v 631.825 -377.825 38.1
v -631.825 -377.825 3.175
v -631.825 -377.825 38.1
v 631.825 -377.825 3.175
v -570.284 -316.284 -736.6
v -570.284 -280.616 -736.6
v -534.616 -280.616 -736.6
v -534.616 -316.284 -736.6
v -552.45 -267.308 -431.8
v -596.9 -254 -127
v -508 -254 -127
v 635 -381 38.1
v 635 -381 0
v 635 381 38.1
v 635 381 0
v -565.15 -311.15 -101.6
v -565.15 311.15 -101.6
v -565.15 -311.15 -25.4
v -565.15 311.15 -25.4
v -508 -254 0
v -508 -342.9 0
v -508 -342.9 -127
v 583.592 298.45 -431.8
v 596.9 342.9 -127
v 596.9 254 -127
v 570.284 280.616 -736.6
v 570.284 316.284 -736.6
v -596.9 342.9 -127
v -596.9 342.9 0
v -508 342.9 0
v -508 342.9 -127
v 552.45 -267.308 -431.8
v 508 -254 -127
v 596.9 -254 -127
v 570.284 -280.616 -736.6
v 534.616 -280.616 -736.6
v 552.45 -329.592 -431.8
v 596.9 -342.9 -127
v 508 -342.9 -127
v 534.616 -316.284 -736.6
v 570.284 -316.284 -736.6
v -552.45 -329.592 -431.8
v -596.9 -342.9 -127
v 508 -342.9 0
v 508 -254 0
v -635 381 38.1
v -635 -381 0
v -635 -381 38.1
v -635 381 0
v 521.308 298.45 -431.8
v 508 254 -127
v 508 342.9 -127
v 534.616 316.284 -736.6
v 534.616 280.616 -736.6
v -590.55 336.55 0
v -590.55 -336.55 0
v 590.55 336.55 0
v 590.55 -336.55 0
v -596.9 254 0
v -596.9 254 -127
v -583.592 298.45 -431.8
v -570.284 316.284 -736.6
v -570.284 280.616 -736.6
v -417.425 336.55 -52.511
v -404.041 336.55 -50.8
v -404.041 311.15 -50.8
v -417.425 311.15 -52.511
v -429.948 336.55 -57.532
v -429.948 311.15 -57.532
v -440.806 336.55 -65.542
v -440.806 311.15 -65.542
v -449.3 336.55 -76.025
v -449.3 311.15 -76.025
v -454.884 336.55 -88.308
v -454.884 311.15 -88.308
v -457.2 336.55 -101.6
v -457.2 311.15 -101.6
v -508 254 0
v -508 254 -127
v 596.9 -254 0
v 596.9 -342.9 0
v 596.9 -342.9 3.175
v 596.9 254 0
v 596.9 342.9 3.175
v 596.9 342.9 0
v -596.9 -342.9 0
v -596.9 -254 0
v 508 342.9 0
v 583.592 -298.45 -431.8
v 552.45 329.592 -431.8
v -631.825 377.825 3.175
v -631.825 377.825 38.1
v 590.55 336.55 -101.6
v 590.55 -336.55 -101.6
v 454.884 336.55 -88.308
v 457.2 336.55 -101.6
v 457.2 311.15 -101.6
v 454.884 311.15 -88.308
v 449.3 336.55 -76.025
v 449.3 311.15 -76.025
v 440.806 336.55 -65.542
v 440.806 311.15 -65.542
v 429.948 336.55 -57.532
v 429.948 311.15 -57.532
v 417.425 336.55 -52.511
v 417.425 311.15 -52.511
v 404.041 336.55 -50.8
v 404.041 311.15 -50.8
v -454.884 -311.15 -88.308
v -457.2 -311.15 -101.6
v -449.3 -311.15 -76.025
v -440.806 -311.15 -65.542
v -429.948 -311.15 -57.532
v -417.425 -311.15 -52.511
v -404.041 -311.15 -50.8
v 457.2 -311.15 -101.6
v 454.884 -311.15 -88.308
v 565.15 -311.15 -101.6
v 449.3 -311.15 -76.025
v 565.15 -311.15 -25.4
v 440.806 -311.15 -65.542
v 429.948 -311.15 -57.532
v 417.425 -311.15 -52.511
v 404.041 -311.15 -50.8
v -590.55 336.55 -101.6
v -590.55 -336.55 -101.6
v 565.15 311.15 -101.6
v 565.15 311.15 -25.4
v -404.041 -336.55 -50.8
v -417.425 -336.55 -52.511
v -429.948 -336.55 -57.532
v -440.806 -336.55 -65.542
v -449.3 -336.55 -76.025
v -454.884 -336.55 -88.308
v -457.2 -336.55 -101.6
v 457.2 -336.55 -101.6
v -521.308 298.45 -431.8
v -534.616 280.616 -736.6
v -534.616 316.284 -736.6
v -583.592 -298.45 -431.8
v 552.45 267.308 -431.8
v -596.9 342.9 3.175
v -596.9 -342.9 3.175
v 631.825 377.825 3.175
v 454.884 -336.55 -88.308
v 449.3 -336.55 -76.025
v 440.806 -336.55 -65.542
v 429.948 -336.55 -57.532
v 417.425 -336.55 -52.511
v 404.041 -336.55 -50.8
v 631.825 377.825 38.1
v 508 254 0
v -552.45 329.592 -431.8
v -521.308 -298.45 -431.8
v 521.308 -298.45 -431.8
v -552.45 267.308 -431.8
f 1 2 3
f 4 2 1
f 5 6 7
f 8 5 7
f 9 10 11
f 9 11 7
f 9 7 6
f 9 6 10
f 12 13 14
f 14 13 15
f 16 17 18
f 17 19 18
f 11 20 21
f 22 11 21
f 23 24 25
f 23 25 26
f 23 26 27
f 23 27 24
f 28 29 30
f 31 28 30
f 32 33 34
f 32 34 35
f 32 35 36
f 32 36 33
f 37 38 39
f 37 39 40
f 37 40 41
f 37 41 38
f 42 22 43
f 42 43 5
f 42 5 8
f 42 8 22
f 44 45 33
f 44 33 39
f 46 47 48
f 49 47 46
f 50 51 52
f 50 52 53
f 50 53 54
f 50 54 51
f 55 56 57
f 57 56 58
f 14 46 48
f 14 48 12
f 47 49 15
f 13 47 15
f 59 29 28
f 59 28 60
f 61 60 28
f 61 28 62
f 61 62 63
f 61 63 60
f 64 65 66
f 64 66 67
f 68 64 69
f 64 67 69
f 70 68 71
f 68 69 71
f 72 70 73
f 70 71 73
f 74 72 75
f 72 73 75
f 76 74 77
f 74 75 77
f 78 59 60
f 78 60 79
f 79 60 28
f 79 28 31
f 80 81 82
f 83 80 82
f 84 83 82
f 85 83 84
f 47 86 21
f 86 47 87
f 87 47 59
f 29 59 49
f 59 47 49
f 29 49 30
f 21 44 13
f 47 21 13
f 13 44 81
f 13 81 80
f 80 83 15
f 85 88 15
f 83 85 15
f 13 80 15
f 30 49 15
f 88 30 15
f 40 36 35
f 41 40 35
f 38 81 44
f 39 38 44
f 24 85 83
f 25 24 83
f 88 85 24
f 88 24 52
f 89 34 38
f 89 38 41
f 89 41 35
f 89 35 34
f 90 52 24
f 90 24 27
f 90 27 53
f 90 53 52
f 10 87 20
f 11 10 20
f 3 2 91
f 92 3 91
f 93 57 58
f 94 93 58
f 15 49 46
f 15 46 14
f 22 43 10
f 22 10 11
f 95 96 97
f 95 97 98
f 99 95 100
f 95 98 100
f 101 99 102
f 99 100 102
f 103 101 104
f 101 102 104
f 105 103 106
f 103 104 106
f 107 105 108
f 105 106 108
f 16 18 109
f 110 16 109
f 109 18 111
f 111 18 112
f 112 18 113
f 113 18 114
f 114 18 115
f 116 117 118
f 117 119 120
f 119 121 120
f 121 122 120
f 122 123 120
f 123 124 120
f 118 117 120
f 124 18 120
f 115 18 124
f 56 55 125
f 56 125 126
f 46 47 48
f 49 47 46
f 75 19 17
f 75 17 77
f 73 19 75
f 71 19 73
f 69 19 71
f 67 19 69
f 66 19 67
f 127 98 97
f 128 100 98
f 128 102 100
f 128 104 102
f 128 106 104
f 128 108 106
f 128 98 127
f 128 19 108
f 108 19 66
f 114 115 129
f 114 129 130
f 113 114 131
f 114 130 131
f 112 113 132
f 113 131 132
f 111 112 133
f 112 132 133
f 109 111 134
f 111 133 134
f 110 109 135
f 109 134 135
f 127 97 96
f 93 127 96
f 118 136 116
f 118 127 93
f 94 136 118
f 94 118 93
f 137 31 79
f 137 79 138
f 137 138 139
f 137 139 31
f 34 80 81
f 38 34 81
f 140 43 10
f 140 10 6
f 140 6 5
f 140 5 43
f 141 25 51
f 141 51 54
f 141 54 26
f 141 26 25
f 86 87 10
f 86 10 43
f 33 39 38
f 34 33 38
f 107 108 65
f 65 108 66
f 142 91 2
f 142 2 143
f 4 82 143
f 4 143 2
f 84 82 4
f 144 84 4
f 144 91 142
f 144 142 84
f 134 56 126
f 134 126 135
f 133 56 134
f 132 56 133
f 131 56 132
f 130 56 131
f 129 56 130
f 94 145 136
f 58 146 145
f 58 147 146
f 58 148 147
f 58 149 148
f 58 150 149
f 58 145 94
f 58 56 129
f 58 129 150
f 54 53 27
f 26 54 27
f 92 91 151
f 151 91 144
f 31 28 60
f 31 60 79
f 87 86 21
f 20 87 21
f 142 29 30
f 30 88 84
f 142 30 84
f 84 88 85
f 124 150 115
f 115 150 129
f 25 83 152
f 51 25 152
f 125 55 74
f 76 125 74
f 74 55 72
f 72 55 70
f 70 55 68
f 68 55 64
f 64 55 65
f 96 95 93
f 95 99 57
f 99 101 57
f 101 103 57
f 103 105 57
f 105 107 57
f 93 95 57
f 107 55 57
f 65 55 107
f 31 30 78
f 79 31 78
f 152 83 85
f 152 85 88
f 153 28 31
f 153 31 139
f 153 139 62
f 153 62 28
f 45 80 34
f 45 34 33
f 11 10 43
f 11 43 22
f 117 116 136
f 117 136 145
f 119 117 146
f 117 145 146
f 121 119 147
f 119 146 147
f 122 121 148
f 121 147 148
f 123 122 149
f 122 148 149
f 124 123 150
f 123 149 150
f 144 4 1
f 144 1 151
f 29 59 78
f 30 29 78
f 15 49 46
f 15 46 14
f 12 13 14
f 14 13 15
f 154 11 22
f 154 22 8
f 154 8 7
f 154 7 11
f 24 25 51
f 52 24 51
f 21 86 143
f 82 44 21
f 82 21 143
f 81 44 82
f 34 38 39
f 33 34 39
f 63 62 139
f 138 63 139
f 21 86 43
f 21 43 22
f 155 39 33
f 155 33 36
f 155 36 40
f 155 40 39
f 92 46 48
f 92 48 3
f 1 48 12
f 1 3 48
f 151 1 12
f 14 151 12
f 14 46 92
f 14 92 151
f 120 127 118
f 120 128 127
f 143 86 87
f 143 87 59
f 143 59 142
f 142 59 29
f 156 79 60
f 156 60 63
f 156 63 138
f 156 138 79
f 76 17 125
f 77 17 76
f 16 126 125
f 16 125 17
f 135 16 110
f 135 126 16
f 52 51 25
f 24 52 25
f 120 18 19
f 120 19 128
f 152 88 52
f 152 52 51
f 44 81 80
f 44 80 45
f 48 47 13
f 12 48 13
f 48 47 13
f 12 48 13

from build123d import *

# Parameters (mm, degrees)
F0_W      = 1270
F0_H      = 762
F0_W_2    = 1263.65
F0_H_2    = 755.65
F1_DEPTH  = 38.1
F3_W      = 88.9
F3_H      = 88.9
F4_DEPTH  = 127
F6_W      = 1181.1
F6_H      = 673.1
F7_DEPTH  = 101.6
F8_T      = -25.4
F9_W      = 1270
F9_H      = 762
F9_W_2    = 1193.8
F9_H_2    = 685.8
F10_DEPTH = 3.175
F11_W     = 1270
F11_H     = 762
F12_DEPTH = 38.1
F13_W     = 88.9
F13_H     = 88.9
F14_DEPTH = 609.6
F14_TAPER = 2.5
F15_W     = 914.4
F15_H     = 89.9768384933
F16_DEPTH = 1219.2


with BuildPart() as f1:
    # F0 (on Top) → F1 (new body)
    with BuildSketch(Plane.XY):
        Rectangle(F0_W, F0_H)
        Rectangle(F0_W_2, F0_H_2, mode=Mode.SUBTRACT)
    extrude(amount=F1_DEPTH)



with BuildPart() as f4:
    # F3 (on face) → F4 (new body)
    with BuildSketch(Plane(origin=(0, 0, 0), x_dir=(1, 0, 0), z_dir=(0, 0, -1))):
        with Locations((-552.45, 298.45)):
            Rectangle(F3_W, F3_H)
    extrude(amount=F4_DEPTH)


with BuildPart() as f4b:
    # F3 (on face) → F4, piece 2 (new body)
    with BuildSketch(Plane(origin=(0, 0, 0), x_dir=(1, 0, 0), z_dir=(0, 0, -1))):
        with Locations((-552.45, -298.45)):
            Rectangle(F3_W, F3_H)
    extrude(amount=F4_DEPTH)


with BuildPart() as f5_1:
    # F5: instance of F4
    add(f4.part.mirror(Plane.YZ))


with BuildPart() as f5_2:
    # F5: instance of F4b
    add(f4b.part.mirror(Plane.YZ))


with BuildPart() as f7:
    # F6 (on face) → F7 (new body)
    with BuildSketch(Plane(origin=(0, 0, 0), x_dir=(1, 0, 0), z_dir=(0, 0, -1))):
        Rectangle(F6_W, F6_H)
    extrude(amount=F7_DEPTH)

    # F8
    f8_openings = [f7.faces().sort_by_distance(p)[0] for p in [
        (0, 0, -101.6),
    ]]
    offset(amount=F8_T, openings=f8_openings)

    # F15 (on face) → F16 (cut)
    with BuildSketch(Plane.XZ.offset(336.55)):
        with BuildLine():
            Line((404.0411037901, -50.8), (-404.0411037901, -50.8))
            ThreePointArc((-404.0411037901, -50.8), (-440.8055847679, -65.5420254846), (-457.2, -101.6))
            Line((-457.2, -101.6), (457.2, -101.6))
            ThreePointArc((457.2, -101.6), (440.8055847679, -65.5420254846), (404.0411037901, -50.8))
        make_face()
        with Locations((0, -146.5884192467)):
            Rectangle(F15_W, F15_H)
    extrude(amount=-F16_DEPTH, mode=Mode.SUBTRACT)


with BuildPart() as f1_1:
    add(f1.part)

    add(f4.part)  # F10 merges F4

    add(f4b.part)  # F10 merges F4b

    add(f5_1.part)  # F10 merges F5_1

    add(f5_2.part)  # F10 merges F5_2
    # F9 (on Top) → F10 (join)
    with BuildSketch(Plane.XY):
        Rectangle(F9_W, F9_H)
        Rectangle(F9_W_2, F9_H_2, mode=Mode.SUBTRACT)
    extrude(amount=F10_DEPTH)


with BuildPart() as f12:
    # F11 (on Top) → F12 (new body)
    with BuildSketch(Plane.XY):
        Rectangle(F11_W, F11_H)
    extrude(amount=F12_DEPTH)


with BuildPart() as f14:
    # F13 (on face) → F14 (new body)
    with BuildSketch(Plane(origin=(0, 0, -127), x_dir=(1, 0, 0), z_dir=(0, 0, -1))):
        with Locations((-552.45, 298.45)):
            Rectangle(F13_W, F13_H)
    extrude(amount=F14_DEPTH, taper=F14_TAPER)


with BuildPart() as f14b:
    # F13 (on face) → F14, piece 2 (new body)
    with BuildSketch(Plane(origin=(0, 0, -127), x_dir=(1, 0, 0), z_dir=(0, 0, -1))):
        with Locations((552.45, 298.45)):
            Rectangle(F13_W, F13_H)
    extrude(amount=F14_DEPTH, taper=F14_TAPER)


with BuildPart() as f14c:
    # F13 (on face) → F14, piece 3 (new body)
    with BuildSketch(Plane(origin=(0, 0, -127), x_dir=(1, 0, 0), z_dir=(0, 0, -1))):
        with Locations((552.45, -298.45)):
            Rectangle(F13_W, F13_H)
    extrude(amount=F14_DEPTH, taper=F14_TAPER)


with BuildPart() as f14d:
    # F13 (on face) → F14, piece 4 (new body)
    with BuildSketch(Plane(origin=(0, 0, -127), x_dir=(1, 0, 0), z_dir=(0, 0, -1))):
        with Locations((-552.45, -298.45)):
            Rectangle(F13_W, F13_H)
    extrude(amount=F14_DEPTH, taper=F14_TAPER)


solid = Compound([f7.part, f1_1.part, f12.part, f14.part, f14b.part, f14c.part, f14d.part])
